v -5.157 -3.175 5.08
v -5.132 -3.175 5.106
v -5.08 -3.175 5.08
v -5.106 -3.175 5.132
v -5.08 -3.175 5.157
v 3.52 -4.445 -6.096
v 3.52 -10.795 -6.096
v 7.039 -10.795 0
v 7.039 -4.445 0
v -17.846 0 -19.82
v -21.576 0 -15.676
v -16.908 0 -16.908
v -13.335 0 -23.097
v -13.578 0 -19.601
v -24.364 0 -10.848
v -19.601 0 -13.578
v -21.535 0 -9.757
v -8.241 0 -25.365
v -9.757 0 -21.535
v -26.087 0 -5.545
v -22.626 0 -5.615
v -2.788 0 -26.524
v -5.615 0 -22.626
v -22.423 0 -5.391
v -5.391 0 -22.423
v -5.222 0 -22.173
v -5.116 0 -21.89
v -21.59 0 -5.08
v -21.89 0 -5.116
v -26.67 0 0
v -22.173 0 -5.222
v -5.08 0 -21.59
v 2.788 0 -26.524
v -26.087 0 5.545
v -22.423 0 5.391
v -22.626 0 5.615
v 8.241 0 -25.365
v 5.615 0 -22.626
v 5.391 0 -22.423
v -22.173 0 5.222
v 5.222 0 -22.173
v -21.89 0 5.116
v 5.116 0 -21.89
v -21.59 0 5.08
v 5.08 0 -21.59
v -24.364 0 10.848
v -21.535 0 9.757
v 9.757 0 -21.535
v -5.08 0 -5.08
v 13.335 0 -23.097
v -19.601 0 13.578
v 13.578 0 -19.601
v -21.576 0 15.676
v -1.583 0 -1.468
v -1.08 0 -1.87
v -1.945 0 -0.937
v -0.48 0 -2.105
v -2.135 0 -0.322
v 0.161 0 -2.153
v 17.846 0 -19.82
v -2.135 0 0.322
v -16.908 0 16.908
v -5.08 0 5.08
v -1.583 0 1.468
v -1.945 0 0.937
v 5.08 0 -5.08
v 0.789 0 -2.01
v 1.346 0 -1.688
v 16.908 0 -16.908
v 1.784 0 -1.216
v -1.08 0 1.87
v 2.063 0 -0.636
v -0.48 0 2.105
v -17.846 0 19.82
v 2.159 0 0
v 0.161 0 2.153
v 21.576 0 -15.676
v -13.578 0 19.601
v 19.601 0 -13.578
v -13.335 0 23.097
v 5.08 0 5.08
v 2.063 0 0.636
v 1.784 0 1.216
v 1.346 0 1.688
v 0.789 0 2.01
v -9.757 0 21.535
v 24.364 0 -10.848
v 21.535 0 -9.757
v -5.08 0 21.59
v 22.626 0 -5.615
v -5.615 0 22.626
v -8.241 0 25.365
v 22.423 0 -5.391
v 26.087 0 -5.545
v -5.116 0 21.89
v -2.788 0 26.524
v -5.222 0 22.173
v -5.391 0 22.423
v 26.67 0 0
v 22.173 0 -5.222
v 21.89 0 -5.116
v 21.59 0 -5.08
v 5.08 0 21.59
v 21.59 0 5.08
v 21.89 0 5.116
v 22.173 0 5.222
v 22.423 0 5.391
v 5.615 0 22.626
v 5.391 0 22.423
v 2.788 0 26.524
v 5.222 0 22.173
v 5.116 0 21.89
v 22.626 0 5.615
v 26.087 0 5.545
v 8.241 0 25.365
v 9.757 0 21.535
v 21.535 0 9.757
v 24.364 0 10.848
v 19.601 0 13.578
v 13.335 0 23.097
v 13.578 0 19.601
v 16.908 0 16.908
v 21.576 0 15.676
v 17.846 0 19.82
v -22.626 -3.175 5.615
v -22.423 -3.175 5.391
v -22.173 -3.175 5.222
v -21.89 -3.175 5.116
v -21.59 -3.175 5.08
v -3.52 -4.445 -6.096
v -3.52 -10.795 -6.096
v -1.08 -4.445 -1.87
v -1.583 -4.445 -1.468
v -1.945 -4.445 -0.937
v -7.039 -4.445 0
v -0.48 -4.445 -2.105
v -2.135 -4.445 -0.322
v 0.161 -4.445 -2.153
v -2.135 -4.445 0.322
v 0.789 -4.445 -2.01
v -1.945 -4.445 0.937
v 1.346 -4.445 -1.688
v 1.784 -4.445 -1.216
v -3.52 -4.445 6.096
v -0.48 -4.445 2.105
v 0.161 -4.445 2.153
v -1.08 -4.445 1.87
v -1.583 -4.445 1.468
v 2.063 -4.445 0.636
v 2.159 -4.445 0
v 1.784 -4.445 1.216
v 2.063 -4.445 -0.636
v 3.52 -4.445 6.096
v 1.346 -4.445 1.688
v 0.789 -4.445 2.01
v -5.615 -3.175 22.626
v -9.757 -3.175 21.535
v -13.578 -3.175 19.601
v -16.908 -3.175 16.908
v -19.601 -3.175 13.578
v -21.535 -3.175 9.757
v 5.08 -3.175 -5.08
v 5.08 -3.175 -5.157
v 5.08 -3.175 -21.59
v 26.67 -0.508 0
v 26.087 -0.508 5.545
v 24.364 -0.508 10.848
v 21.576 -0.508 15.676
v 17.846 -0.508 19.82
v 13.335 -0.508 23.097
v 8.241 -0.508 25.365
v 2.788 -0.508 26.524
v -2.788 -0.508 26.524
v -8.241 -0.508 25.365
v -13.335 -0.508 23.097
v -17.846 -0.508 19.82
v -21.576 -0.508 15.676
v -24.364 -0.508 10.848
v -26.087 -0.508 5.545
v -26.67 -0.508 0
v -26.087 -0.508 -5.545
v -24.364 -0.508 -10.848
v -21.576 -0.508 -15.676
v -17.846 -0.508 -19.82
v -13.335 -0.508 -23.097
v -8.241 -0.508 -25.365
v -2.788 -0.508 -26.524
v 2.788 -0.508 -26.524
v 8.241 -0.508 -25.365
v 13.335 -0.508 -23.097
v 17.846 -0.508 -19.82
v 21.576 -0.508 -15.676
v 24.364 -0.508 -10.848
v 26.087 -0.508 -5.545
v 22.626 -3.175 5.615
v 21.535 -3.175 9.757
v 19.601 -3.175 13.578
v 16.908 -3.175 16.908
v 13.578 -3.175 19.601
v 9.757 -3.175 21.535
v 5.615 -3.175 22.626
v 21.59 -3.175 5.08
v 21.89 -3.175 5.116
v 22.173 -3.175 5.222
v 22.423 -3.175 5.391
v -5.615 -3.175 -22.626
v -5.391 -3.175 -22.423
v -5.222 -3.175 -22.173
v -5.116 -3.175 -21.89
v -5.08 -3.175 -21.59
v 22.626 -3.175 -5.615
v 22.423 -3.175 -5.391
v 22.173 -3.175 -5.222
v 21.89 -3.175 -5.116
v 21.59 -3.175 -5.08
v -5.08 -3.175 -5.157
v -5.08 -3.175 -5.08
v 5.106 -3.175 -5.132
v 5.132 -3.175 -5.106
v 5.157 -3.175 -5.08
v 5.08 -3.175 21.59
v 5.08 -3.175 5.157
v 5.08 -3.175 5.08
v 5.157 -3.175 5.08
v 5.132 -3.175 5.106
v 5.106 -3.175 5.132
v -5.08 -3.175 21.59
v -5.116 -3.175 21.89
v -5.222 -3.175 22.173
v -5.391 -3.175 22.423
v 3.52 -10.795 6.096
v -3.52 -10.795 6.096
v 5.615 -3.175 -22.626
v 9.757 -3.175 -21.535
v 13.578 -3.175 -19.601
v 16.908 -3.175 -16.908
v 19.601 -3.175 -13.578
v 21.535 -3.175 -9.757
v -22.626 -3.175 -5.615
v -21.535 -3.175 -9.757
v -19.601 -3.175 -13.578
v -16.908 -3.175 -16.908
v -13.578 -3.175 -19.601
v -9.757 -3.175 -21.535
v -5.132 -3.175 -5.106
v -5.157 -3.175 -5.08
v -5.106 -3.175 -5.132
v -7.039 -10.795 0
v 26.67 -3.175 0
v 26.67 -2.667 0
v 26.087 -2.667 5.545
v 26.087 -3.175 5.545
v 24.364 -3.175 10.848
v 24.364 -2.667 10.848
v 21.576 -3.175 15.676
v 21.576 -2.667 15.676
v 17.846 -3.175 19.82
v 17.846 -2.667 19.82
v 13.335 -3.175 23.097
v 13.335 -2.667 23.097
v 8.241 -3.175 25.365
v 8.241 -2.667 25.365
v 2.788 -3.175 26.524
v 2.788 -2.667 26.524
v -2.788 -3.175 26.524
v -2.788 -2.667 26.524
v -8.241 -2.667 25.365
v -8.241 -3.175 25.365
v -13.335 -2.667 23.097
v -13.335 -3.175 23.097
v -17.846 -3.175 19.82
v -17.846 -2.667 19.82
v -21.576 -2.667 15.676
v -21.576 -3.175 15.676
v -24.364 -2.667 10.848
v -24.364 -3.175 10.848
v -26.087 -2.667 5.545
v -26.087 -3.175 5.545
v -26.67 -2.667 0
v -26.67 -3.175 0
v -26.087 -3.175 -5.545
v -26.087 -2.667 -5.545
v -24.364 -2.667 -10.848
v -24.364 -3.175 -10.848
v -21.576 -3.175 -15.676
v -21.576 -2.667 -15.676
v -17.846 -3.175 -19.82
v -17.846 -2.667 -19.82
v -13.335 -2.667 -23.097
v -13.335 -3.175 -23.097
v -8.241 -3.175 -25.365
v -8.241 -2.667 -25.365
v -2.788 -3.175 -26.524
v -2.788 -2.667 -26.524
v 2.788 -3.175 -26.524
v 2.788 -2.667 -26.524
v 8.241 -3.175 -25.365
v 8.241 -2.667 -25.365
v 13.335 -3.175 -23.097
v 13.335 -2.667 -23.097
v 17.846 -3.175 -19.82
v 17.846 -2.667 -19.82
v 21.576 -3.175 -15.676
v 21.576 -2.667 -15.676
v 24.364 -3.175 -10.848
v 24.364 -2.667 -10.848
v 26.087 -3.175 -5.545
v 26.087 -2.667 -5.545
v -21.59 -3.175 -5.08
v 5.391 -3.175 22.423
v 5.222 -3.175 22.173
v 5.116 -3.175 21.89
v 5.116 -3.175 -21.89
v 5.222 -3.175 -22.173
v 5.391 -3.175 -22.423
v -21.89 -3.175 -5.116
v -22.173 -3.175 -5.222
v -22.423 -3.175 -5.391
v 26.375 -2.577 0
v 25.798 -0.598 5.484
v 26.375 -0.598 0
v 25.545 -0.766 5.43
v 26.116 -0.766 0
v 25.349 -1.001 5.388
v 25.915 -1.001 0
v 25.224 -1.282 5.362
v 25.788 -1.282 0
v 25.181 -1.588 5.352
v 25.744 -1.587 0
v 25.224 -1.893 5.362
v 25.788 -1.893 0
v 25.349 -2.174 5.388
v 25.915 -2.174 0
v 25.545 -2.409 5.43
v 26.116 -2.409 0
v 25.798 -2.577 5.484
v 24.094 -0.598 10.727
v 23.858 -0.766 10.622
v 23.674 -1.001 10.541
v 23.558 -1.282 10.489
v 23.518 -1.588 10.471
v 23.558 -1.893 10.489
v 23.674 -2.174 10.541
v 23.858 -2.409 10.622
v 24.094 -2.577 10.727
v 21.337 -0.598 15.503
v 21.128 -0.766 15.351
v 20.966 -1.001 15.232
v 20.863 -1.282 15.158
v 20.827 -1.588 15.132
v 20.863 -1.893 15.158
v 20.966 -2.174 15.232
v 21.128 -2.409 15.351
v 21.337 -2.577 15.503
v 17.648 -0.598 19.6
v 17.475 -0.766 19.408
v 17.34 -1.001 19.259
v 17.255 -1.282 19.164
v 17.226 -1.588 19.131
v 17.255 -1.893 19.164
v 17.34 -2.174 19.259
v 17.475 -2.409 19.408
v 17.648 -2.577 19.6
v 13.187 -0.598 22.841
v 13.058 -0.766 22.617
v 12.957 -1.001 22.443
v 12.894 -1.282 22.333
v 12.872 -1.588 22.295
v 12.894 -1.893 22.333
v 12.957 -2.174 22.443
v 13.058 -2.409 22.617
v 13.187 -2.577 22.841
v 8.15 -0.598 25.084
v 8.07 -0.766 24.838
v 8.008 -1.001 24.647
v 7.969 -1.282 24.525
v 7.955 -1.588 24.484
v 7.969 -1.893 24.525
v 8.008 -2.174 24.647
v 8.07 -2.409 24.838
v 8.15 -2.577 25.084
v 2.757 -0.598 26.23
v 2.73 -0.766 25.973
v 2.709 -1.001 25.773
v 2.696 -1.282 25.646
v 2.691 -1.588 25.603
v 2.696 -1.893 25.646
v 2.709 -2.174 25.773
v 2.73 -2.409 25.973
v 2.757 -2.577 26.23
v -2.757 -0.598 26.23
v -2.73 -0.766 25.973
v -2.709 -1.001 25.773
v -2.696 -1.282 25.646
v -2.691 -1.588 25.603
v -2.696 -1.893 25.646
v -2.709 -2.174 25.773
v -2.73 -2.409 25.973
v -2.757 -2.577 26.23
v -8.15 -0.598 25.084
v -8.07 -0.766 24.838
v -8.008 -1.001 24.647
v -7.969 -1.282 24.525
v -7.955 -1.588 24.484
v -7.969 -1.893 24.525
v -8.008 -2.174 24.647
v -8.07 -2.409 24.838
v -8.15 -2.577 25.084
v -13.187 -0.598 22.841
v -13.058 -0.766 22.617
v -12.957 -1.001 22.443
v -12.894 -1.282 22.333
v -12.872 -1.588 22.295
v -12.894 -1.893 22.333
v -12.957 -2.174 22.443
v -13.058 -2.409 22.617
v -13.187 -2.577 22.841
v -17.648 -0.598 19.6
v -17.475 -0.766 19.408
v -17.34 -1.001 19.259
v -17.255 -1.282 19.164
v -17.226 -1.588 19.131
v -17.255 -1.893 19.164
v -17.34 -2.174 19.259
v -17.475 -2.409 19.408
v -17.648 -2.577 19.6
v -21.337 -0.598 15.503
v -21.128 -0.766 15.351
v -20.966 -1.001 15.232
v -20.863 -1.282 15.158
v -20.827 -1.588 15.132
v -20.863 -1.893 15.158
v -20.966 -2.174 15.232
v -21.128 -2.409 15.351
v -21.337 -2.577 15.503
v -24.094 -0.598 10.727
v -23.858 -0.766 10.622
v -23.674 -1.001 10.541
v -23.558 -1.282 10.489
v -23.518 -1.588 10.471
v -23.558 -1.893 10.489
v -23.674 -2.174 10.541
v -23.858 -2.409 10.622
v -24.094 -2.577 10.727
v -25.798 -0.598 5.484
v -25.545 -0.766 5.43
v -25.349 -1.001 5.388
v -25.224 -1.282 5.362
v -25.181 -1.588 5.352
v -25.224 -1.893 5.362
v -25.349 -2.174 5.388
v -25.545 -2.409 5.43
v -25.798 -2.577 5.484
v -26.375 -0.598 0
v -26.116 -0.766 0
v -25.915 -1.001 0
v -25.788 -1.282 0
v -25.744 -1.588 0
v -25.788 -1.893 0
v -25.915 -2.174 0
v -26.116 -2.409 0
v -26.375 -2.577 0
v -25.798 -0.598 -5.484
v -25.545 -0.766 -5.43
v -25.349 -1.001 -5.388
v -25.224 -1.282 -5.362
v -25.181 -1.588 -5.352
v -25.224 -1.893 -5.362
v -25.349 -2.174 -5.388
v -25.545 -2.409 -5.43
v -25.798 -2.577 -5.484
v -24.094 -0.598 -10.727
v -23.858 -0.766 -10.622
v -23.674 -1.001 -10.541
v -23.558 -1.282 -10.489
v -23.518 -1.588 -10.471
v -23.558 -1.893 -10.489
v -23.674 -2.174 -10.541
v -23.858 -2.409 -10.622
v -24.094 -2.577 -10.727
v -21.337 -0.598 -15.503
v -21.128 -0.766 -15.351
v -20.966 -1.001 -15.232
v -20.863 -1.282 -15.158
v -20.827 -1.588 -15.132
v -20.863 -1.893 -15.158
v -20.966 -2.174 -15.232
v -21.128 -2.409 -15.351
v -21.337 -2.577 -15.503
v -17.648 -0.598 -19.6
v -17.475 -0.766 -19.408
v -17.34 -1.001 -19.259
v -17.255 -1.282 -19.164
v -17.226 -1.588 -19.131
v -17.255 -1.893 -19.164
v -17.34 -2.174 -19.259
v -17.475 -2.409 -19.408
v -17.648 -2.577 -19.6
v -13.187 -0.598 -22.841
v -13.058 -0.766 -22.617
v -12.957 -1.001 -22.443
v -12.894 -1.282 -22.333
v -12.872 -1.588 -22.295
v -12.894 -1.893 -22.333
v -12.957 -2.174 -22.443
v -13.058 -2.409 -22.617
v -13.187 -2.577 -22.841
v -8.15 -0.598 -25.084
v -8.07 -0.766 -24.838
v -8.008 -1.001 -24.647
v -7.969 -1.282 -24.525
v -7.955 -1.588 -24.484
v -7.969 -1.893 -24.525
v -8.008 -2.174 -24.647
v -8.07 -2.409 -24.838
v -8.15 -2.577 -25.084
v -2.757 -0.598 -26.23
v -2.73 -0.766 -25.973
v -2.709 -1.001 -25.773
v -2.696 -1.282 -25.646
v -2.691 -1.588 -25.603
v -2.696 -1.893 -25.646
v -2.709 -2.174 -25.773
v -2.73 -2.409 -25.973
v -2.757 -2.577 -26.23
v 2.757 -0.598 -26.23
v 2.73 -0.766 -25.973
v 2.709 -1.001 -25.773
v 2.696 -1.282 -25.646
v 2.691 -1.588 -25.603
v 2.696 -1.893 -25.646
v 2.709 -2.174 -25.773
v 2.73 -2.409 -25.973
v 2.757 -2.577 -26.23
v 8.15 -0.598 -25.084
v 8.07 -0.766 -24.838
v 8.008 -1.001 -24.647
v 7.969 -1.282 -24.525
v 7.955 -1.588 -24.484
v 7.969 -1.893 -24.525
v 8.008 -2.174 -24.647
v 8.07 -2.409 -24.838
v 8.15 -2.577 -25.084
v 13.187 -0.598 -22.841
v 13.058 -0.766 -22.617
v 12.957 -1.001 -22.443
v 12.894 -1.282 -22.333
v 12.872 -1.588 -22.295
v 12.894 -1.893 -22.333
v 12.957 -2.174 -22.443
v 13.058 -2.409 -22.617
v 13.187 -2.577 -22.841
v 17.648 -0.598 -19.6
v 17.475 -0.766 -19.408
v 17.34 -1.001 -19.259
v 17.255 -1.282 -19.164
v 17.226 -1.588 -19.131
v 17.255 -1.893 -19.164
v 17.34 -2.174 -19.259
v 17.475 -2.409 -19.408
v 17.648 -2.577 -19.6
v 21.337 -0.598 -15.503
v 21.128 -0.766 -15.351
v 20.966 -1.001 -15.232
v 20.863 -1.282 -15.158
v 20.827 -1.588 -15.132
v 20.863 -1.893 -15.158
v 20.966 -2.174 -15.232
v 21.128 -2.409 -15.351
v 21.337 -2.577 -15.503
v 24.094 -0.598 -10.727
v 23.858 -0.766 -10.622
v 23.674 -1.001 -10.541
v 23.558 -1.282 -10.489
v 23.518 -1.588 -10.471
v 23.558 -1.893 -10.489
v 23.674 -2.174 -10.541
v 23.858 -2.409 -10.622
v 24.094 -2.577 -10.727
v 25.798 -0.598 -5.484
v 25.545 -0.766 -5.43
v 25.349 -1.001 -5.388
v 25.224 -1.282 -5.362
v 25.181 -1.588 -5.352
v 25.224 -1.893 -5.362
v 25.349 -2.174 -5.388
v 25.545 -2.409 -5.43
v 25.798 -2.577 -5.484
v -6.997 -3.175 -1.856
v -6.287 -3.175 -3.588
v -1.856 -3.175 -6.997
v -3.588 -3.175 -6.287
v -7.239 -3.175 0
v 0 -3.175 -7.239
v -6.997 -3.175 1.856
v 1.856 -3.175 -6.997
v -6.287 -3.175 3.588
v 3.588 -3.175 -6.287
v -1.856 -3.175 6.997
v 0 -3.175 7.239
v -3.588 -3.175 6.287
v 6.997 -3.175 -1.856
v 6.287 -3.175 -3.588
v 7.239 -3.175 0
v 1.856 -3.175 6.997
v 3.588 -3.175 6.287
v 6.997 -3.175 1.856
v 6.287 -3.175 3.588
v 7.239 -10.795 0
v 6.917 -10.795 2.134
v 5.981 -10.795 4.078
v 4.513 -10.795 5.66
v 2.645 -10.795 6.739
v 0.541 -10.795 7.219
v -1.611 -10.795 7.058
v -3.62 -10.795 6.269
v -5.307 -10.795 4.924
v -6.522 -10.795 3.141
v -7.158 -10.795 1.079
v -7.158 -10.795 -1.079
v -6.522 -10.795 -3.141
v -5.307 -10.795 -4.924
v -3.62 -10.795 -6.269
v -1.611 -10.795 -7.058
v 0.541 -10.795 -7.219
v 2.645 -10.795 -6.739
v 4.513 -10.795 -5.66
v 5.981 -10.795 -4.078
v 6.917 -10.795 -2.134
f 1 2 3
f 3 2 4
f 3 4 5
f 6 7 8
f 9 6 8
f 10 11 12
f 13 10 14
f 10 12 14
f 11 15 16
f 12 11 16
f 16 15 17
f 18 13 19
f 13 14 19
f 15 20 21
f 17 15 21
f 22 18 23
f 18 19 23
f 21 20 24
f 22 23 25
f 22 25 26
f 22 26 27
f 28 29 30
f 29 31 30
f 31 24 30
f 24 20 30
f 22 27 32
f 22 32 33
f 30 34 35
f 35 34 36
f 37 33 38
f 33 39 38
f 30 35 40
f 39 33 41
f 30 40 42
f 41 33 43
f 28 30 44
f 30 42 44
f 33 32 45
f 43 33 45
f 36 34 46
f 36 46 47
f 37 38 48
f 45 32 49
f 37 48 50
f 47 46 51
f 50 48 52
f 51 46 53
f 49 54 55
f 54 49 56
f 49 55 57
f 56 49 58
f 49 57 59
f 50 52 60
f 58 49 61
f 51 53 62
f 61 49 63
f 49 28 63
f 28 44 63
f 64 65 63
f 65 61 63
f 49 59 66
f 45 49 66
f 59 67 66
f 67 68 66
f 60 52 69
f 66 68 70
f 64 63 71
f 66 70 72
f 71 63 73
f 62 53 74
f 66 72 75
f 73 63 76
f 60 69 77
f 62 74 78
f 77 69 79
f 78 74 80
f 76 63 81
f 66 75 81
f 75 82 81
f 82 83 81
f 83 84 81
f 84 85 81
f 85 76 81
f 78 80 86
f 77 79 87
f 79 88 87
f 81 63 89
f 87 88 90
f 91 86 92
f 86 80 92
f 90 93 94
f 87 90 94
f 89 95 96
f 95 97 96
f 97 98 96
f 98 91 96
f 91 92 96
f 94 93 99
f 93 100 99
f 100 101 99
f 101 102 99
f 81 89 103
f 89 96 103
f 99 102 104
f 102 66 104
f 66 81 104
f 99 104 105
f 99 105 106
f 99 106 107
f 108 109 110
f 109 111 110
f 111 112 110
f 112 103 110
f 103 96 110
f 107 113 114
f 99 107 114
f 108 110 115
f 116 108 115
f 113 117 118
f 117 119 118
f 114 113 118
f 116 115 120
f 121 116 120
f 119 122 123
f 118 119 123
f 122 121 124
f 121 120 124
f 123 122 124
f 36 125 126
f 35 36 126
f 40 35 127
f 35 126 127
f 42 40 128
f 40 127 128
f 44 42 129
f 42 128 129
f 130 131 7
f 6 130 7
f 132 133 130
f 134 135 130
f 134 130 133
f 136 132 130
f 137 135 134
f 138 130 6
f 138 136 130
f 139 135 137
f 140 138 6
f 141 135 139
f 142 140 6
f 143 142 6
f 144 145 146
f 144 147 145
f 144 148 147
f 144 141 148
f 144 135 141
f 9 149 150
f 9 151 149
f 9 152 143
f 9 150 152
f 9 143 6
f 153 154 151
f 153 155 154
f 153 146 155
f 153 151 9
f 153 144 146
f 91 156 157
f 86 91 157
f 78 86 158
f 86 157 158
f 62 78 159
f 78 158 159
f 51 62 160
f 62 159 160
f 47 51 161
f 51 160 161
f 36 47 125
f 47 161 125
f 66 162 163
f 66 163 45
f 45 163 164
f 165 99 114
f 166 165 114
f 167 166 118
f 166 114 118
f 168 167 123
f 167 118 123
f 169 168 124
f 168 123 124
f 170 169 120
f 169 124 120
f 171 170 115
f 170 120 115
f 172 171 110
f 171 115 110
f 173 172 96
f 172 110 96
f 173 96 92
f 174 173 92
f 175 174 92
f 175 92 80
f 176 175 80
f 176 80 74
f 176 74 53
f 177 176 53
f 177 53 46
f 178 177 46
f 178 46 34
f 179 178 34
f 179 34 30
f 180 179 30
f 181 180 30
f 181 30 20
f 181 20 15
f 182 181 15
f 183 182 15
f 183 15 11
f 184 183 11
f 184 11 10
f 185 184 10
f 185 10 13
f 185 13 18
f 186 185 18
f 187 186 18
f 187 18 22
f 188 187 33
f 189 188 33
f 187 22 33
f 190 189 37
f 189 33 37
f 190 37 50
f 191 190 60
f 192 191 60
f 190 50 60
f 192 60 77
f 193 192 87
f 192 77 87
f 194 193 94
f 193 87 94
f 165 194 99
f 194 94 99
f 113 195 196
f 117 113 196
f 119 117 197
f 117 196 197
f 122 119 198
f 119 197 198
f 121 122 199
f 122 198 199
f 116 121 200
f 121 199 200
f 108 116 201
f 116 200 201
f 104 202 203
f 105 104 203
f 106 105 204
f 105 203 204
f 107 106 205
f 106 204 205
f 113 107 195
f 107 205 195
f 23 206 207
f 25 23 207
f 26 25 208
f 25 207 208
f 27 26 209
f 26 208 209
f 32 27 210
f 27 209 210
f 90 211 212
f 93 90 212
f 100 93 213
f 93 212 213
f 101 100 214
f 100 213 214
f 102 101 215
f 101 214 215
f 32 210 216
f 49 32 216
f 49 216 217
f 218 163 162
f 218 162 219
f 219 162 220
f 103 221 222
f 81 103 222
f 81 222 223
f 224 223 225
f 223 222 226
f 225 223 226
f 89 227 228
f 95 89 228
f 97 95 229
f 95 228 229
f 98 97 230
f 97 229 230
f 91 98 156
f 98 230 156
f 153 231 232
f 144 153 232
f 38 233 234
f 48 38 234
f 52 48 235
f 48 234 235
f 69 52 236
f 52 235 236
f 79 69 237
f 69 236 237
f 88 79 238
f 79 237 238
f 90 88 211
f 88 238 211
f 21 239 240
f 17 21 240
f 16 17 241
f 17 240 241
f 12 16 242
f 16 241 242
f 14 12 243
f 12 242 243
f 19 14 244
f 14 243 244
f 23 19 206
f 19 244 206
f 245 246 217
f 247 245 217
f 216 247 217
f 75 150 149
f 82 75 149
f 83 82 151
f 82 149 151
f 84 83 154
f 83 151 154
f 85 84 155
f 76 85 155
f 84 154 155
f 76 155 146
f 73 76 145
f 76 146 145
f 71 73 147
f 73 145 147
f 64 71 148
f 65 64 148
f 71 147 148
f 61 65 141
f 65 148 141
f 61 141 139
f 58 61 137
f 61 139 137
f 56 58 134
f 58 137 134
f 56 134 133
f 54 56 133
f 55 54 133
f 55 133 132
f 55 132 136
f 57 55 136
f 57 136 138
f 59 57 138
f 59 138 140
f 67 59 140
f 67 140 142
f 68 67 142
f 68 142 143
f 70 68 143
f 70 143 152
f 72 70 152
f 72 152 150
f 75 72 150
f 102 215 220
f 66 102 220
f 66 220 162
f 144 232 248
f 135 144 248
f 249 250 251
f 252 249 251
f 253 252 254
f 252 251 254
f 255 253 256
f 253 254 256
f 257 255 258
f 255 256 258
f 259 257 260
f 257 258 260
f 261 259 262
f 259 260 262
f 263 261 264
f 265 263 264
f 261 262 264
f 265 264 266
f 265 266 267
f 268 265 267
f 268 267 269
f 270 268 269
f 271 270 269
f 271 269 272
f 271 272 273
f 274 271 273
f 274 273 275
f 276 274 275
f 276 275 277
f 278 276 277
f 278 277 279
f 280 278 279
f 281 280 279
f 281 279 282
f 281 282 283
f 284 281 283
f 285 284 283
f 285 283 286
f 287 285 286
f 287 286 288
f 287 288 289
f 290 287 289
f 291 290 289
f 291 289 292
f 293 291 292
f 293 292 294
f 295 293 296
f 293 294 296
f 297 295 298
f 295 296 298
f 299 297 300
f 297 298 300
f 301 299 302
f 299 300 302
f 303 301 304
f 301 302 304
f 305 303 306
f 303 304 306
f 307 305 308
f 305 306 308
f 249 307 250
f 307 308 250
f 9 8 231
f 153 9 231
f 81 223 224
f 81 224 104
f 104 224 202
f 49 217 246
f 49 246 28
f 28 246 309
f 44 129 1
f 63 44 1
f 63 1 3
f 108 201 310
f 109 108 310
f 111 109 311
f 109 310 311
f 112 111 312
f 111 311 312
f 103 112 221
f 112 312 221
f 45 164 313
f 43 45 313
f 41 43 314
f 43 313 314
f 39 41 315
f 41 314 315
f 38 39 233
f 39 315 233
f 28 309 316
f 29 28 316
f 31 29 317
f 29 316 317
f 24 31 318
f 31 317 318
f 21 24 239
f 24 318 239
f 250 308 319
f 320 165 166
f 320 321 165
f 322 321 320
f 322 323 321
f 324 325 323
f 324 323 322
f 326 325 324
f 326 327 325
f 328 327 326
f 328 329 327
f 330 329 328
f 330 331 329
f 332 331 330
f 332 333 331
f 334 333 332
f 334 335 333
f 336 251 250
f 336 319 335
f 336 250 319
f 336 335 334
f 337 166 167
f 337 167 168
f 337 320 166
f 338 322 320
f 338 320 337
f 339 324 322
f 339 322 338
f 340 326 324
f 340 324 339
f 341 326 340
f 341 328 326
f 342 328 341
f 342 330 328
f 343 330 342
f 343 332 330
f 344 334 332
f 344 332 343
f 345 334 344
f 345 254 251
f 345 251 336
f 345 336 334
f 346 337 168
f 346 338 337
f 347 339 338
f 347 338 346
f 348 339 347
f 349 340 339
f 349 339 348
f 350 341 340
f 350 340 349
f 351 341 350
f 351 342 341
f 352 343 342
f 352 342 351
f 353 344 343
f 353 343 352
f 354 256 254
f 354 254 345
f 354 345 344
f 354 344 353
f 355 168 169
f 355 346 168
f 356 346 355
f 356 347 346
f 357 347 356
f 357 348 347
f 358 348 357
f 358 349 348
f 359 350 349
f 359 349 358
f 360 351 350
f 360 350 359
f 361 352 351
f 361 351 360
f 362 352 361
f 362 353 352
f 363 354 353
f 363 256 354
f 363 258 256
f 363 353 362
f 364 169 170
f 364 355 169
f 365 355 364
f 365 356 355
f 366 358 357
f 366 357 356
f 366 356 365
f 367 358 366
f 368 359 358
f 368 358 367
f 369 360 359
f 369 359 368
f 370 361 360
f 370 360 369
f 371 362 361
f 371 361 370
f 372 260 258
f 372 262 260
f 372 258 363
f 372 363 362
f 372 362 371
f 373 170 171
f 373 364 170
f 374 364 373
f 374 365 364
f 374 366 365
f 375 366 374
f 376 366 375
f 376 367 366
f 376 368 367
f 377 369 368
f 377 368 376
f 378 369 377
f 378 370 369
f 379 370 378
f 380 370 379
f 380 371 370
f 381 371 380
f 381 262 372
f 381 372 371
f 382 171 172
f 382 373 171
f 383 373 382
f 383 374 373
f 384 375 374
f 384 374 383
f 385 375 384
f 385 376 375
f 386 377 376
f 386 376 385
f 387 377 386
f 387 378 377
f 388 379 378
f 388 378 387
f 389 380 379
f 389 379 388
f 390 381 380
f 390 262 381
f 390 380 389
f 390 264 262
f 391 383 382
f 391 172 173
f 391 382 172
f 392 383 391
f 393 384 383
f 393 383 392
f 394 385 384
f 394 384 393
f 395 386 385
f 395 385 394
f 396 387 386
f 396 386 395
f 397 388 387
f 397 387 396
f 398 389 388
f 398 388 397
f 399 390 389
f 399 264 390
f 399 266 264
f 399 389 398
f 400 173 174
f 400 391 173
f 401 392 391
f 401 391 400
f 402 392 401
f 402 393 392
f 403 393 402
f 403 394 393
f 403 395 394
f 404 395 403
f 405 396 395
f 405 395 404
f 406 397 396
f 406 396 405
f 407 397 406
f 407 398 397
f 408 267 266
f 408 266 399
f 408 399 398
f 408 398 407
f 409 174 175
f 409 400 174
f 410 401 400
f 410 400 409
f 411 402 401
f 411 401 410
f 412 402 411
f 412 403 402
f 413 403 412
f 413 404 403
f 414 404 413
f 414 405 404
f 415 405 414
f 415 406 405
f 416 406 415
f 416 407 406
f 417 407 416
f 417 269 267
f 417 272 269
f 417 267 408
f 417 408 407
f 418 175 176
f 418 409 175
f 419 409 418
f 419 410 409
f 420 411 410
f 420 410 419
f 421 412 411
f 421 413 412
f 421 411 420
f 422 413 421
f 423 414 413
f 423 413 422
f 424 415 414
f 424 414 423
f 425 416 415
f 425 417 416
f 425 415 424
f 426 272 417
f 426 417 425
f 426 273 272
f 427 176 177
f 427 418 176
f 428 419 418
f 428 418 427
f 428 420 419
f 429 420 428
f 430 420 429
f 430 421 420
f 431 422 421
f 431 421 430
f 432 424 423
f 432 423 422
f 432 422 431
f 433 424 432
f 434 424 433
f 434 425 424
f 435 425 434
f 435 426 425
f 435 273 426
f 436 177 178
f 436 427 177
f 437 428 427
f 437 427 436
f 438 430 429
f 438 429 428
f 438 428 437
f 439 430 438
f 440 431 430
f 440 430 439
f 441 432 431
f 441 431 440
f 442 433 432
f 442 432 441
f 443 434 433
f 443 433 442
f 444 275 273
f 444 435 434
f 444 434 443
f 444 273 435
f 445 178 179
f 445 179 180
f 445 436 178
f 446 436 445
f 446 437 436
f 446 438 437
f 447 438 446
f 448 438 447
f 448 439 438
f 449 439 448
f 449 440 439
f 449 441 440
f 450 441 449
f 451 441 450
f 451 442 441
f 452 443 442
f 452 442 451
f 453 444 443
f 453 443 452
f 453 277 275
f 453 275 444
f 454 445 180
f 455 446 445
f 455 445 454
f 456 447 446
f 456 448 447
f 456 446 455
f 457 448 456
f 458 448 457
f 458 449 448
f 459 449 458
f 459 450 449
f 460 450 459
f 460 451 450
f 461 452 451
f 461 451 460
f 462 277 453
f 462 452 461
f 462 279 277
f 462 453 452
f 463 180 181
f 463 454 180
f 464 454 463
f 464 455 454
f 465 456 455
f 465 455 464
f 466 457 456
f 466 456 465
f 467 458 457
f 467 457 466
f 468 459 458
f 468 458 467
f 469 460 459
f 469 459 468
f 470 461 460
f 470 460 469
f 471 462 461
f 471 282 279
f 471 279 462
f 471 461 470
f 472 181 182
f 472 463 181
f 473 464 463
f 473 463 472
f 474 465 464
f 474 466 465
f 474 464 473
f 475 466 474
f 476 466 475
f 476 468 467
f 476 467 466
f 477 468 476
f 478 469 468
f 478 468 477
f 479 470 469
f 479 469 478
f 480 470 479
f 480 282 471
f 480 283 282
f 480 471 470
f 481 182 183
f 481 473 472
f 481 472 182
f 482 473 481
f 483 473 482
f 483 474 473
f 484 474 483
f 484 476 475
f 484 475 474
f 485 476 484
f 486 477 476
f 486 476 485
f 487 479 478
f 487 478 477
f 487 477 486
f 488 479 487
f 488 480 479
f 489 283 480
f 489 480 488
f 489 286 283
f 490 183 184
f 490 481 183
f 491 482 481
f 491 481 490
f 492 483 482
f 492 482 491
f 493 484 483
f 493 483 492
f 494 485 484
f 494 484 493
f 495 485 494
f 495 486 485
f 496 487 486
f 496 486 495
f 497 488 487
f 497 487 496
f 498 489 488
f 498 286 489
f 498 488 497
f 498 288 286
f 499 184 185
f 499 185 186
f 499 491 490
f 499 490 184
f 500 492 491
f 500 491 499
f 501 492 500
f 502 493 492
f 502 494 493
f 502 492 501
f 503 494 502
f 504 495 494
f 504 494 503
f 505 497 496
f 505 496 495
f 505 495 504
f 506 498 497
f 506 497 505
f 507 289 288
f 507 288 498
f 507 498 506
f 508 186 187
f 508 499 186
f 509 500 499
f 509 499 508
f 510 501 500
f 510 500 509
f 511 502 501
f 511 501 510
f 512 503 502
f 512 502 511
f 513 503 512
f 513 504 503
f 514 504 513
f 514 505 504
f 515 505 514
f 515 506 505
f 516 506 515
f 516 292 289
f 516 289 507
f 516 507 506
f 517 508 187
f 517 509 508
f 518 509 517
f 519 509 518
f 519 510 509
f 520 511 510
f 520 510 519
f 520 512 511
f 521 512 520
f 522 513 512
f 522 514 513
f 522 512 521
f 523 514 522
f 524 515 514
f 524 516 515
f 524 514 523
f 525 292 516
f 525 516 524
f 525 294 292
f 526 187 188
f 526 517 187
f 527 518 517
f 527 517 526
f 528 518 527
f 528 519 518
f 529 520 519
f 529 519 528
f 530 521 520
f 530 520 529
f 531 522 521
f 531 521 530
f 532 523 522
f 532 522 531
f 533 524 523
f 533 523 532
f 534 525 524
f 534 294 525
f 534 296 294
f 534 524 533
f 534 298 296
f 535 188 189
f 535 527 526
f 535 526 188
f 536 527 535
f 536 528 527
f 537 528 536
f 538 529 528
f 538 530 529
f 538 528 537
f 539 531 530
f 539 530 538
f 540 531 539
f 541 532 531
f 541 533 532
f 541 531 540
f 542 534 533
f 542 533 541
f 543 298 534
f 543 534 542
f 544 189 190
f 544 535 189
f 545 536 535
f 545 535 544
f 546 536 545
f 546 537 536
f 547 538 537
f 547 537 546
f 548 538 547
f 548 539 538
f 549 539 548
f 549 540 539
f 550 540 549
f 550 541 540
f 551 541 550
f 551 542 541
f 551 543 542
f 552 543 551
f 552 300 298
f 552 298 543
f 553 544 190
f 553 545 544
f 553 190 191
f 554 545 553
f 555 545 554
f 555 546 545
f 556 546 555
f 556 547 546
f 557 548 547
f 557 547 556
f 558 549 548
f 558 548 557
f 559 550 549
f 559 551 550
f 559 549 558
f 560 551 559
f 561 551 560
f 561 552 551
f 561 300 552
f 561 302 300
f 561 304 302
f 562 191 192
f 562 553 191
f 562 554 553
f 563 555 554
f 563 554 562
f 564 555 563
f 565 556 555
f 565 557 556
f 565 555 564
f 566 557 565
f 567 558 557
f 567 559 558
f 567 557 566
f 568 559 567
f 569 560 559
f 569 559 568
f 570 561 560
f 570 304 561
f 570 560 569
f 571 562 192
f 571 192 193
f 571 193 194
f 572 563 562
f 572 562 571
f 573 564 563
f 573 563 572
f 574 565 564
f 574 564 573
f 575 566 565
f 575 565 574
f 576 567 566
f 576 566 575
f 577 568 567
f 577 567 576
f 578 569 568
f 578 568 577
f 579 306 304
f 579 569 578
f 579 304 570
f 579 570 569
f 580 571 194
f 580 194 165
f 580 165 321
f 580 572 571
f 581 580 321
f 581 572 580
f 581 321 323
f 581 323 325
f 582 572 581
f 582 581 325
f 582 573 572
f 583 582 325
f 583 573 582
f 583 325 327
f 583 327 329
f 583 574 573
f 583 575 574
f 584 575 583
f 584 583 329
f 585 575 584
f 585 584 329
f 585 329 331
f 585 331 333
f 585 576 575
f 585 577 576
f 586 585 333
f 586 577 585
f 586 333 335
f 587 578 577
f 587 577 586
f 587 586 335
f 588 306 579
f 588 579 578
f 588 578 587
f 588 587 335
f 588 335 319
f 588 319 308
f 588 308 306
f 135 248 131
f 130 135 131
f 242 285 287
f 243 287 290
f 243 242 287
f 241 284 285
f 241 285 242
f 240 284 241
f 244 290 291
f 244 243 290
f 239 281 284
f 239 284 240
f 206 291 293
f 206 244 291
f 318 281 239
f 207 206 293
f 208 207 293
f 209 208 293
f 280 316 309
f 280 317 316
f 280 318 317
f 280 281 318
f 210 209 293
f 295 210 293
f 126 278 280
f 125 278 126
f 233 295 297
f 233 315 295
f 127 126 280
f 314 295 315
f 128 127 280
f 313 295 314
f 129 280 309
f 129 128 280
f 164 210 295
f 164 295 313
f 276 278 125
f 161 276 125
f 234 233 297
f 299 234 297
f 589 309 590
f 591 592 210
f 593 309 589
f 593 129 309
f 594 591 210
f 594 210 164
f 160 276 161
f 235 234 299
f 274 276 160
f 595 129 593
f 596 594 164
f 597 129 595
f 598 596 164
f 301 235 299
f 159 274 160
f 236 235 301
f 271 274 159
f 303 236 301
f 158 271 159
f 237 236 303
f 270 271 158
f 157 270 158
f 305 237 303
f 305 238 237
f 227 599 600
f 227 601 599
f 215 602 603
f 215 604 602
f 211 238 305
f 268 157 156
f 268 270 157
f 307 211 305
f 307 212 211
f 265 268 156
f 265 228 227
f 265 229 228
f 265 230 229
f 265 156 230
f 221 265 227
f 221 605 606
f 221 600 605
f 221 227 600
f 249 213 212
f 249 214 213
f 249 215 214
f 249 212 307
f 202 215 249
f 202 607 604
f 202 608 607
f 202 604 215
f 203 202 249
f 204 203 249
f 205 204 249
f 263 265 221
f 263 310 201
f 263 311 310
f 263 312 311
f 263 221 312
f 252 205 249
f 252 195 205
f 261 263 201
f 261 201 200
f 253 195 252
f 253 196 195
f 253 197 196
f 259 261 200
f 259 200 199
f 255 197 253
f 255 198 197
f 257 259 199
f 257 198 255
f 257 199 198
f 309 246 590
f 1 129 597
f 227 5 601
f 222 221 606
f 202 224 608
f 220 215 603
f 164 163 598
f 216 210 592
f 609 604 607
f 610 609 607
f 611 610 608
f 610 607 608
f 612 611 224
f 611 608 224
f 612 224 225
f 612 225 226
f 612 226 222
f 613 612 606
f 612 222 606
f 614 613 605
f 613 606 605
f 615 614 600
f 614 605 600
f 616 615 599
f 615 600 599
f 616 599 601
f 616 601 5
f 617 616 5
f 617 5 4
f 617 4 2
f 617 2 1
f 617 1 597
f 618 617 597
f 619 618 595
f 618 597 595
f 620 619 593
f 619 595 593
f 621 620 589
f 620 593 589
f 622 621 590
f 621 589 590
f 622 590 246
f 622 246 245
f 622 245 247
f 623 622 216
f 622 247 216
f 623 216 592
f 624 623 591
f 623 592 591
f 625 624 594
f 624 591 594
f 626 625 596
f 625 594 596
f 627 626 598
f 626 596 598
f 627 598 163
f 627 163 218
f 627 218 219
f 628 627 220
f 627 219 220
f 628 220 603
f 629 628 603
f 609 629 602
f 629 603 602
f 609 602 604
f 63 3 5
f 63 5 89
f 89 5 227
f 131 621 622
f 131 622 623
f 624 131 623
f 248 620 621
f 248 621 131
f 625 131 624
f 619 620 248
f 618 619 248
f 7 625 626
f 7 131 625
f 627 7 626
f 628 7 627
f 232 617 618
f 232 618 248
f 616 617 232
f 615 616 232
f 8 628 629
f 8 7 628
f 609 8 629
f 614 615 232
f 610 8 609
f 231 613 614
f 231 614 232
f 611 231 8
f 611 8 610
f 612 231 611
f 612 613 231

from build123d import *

# Parameters (mm, degrees)
F0_R     = 26.67
F1_DEPTH = 3.175
F3_DEPTH = 25.4
F4_R     = 7.239
F5_DEPTH = 7.62
F7_DEPTH = 6.35
F8_R     = 2.159
F9_DEPTH = 25.4


with BuildPart() as f1:
    # F0 (on Front) → F1 (new body)
    with BuildSketch(Plane.XZ):
        Circle(F0_R)
    extrude(amount=F1_DEPTH)

    # F2 (on face) → F3 (cut)
    with BuildSketch(Plane.XZ.offset(3.175)):
        with BuildLine():
            Line((-21.59, 5.08), (-5.08, 5.08))
            Line((-5.08, 5.08), (-5.08, 21.59))
            ThreePointArc((-5.08, 21.59), (-5.221742, 22.173039), (-5.61533, 22.625934))
            ThreePointArc((-5.61533, 22.625934), (-16.90841, 16.90841), (-22.625934, 5.61533))
            ThreePointArc((-22.625934, 5.61533), (-22.173039, 5.221742), (-21.59, 5.08))
        make_face()
        with BuildLine():
            ThreePointArc((-21.59, -5.08), (-22.173039, -5.221742), (-22.625934, -5.61533))
            ThreePointArc((-22.625934, -5.61533), (-16.90841, -16.90841), (-5.61533, -22.625934))
            ThreePointArc((-5.61533, -22.625934), (-5.221742, -22.173039), (-5.08, -21.59))
            Line((-5.08, -21.59), (-5.08, -5.08))
            Line((-5.08, -5.08), (-21.59, -5.08))
        make_face()
        with BuildLine():
            ThreePointArc((5.08, -21.59), (5.221742, -22.173039), (5.61533, -22.625934))
            ThreePointArc((5.61533, -22.625934), (16.90841, -16.90841), (22.625934, -5.61533))
            ThreePointArc((22.625934, -5.61533), (22.173039, -5.221742), (21.59, -5.08))
            Line((21.59, -5.08), (5.08, -5.08))
            Line((5.08, -5.08), (5.08, -21.59))
        make_face()
        with BuildLine():
            ThreePointArc((21.59, 5.08), (22.173039, 5.221742), (22.625934, 5.61533))
            ThreePointArc((22.625934, 5.61533), (16.90841, 16.90841), (5.61533, 22.625934))
            ThreePointArc((5.61533, 22.625934), (5.221742, 22.173039), (5.08, 21.59))
            Line((5.08, 21.59), (5.08, 5.08))
            Line((5.08, 5.08), (21.59, 5.08))
        make_face()
    extrude(amount=-F3_DEPTH, mode=Mode.SUBTRACT)

    # F4 (on face) → F5 (join)
    with BuildSketch(Plane.XZ.offset(3.175)):
        Circle(F4_R)
    extrude(amount=F5_DEPTH)

    # F6 (on face) → F7 (cut)
    with BuildSketch(Plane.XZ.offset(10.795)):
        Polygon((3.519527, -6.096), (7.039054, 0), (3.519527, 6.096), (-3.519527, 6.096), (-7.039054, 0), (-3.519527, -6.096), align=None)
    extrude(amount=-F7_DEPTH, mode=Mode.SUBTRACT)

    # F8 (on face) → F9 (cut)
    with BuildSketch(Plane.XZ.offset(4.445)):
        Circle(F8_R)
    extrude(amount=-F9_DEPTH, mode=Mode.SUBTRACT)

    # F10 (on Top) → F11 (revolve, cut)
    with BuildSketch(Plane.XY):
        with BuildLine():
            Line((26.67, -2.667), (26.67, -0.508))
            ThreePointArc((26.67, -0.508), (25.743874, -1.5875), (26.67, -2.667))
        make_face()
    revolve(axis=Axis((0, -1.5875, 0), (0, -1, 0)), mode=Mode.SUBTRACT)


solid = f1.part
